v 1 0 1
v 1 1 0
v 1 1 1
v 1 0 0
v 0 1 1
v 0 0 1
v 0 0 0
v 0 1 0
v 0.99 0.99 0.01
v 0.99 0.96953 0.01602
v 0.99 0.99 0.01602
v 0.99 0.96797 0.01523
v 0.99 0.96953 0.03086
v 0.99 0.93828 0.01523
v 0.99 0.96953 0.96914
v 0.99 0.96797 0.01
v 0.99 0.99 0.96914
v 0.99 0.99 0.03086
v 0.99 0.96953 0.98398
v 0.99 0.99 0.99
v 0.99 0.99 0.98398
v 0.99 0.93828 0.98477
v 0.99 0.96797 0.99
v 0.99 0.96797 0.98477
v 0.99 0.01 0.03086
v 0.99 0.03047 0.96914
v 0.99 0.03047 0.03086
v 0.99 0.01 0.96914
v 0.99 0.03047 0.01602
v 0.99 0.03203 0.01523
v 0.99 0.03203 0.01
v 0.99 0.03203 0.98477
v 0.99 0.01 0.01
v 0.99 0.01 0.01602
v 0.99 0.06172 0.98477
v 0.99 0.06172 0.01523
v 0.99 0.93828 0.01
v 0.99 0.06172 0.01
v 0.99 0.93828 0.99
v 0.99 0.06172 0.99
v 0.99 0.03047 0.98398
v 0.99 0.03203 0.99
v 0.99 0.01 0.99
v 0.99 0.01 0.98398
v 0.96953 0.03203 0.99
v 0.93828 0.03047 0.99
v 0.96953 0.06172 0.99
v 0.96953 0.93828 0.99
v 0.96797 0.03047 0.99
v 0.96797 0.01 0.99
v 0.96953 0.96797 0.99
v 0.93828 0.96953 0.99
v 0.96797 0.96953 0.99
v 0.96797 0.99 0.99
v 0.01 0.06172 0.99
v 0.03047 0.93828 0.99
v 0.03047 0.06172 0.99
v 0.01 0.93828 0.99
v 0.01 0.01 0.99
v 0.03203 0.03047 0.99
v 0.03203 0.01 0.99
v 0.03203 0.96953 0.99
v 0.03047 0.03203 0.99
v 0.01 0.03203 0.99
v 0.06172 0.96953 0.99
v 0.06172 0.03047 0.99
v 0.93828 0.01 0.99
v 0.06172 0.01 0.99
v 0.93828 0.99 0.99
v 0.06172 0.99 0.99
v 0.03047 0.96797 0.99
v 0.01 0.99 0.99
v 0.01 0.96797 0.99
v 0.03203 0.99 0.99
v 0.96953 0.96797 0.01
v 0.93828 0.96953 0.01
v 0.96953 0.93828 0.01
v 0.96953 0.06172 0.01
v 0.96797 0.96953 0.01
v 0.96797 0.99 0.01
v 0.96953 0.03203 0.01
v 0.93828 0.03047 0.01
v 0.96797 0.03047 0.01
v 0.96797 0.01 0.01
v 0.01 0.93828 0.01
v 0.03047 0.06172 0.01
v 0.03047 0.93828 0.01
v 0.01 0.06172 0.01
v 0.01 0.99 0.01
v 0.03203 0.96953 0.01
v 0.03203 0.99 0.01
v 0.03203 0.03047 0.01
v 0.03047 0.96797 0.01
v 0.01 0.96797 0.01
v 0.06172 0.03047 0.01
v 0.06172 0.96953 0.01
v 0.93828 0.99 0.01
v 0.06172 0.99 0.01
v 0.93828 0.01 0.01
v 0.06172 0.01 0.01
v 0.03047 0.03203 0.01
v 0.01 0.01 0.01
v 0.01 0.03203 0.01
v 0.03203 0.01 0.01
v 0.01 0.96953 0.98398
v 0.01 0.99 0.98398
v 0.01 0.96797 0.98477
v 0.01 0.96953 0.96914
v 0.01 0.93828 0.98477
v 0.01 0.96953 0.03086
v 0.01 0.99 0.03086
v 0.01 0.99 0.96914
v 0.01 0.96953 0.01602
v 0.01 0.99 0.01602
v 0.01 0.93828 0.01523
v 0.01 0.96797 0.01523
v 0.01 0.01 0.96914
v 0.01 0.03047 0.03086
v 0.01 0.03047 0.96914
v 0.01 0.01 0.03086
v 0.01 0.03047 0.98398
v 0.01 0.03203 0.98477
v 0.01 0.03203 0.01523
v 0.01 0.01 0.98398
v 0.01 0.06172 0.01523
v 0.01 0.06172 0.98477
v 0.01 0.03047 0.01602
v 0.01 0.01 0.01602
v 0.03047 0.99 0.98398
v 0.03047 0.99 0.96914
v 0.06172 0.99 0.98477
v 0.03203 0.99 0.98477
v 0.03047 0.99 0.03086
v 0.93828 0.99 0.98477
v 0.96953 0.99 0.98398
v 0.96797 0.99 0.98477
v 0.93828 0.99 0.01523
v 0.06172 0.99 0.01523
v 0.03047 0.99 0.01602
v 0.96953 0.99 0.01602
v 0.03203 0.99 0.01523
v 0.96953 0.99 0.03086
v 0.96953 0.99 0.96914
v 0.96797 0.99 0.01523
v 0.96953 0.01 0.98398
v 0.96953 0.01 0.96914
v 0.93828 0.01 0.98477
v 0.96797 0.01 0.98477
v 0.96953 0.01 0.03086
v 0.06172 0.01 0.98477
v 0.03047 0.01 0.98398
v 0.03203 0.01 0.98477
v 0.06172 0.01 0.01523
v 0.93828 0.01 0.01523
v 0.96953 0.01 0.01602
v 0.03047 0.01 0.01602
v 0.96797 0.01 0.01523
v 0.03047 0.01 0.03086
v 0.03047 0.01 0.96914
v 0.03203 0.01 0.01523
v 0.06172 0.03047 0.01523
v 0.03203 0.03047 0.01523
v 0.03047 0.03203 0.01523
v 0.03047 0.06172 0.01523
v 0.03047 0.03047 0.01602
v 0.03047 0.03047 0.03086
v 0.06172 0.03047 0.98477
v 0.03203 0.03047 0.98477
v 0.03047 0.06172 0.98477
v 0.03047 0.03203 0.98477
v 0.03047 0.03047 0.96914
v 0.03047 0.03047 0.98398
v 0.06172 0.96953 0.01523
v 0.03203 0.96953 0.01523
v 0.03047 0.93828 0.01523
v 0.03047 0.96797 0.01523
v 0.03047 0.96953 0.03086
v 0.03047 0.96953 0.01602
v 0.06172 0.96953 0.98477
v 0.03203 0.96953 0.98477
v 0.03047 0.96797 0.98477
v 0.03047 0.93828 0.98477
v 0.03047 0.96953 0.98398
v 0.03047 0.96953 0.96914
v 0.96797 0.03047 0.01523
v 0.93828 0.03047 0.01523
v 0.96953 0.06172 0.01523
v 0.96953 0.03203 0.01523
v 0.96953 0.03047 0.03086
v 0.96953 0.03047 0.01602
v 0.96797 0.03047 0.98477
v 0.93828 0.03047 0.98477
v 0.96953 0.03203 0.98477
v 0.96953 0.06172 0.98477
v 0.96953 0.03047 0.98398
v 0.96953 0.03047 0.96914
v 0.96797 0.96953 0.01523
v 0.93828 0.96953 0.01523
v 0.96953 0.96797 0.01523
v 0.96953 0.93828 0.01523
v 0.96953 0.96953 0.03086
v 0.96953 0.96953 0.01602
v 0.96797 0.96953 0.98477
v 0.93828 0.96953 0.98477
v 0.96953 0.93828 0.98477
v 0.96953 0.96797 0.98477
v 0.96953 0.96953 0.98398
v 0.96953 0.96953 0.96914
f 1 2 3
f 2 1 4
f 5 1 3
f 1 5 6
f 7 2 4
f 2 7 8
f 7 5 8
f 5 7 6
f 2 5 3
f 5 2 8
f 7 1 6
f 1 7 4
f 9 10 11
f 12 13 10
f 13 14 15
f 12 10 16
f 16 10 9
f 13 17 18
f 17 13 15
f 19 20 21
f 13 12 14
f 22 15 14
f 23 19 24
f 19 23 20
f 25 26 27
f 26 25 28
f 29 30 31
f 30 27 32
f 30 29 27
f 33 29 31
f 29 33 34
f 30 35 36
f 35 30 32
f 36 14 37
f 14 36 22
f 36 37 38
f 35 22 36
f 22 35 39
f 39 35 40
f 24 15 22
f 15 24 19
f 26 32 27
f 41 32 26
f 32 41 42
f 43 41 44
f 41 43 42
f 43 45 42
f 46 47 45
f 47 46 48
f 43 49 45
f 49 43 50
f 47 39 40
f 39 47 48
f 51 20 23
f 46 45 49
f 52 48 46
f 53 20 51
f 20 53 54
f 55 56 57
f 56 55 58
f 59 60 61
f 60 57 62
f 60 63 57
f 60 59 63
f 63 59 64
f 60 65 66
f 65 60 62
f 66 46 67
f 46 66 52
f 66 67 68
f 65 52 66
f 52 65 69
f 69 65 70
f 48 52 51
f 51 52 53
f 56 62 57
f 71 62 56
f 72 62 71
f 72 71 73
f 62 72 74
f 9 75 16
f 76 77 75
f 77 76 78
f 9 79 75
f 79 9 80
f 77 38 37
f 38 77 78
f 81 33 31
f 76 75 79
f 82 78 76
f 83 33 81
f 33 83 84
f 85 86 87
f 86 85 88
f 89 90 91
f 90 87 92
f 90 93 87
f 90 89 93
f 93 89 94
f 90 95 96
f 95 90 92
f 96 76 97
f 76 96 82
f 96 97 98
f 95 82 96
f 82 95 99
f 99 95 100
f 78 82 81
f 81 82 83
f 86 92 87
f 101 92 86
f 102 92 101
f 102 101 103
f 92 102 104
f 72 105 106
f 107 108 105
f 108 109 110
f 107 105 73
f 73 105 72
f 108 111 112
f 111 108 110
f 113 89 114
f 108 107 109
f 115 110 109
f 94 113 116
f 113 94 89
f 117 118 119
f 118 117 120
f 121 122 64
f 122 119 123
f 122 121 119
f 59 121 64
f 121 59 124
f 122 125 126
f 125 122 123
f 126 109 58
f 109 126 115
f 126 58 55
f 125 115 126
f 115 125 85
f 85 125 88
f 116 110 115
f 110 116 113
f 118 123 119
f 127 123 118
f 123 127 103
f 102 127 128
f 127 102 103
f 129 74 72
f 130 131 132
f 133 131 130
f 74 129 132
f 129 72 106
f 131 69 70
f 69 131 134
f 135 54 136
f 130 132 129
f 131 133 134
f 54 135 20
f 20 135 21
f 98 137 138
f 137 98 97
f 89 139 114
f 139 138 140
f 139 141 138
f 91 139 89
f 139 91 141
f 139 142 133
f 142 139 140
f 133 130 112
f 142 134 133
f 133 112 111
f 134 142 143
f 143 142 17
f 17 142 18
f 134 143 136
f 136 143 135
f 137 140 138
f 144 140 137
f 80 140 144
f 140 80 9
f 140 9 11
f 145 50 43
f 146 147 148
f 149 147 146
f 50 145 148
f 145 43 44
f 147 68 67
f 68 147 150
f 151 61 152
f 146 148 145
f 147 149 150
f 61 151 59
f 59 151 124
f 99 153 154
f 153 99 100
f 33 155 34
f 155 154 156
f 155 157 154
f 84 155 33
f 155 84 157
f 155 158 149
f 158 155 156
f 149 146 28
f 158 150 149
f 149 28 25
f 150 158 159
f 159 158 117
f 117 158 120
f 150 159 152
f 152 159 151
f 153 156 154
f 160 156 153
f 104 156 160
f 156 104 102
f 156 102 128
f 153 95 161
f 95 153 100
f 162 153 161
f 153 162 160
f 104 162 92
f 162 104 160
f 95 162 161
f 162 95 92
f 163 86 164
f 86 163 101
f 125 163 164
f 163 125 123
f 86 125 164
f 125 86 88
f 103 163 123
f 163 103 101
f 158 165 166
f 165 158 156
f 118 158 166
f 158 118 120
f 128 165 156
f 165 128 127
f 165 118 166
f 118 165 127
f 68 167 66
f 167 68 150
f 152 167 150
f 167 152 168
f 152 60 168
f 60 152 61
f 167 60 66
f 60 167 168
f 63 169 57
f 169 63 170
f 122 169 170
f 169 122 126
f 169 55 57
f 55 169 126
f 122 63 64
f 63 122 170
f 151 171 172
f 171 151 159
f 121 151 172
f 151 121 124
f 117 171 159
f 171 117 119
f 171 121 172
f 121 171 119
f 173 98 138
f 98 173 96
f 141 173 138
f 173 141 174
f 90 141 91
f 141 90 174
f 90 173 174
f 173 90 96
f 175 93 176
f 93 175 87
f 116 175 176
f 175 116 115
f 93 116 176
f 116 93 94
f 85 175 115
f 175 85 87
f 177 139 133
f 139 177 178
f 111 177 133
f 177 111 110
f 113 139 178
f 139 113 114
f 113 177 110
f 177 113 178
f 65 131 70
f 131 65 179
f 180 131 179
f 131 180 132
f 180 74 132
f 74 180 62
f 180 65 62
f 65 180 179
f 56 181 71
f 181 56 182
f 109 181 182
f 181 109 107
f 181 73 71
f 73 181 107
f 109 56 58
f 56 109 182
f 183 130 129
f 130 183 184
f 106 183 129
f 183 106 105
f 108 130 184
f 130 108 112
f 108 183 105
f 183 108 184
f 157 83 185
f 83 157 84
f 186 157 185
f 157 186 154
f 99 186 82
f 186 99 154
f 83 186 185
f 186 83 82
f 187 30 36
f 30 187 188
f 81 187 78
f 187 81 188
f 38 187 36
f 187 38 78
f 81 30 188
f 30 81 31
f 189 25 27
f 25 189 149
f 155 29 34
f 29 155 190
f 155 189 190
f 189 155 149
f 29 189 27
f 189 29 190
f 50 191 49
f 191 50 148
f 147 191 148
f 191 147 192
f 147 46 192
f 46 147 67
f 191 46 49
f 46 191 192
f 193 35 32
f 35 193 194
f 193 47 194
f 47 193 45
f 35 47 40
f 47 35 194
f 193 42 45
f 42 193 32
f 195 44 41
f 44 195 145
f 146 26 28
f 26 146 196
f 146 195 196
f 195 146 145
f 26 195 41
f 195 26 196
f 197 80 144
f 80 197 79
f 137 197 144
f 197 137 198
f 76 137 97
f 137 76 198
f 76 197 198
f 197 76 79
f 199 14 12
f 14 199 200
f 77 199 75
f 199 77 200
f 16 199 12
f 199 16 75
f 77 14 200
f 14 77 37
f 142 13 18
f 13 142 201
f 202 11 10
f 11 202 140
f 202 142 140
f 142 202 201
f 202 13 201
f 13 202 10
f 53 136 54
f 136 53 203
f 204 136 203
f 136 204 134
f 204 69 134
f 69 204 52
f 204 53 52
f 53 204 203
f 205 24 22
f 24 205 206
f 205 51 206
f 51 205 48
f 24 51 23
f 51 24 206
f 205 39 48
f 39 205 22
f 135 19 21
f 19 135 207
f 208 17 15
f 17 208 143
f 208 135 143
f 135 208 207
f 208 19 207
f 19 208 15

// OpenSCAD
translate([0.046875, 0.015625, 0.0078125]) color([0.09291561905233803, 0.32559643331469756, 0.8637836206731688]) cube([0.0296875, 0.0296875, 0.01484375], center=true);
translate([0.015625, 0.046875, 0.0078125]) color([0.0755408536708897, 0.1598560105102368, 0.31161941001335236]) cube([0.0296875, 0.0296875, 0.01484375], center=true);
translate([0.015625, 0.015625, 0.0234375]) color([0.5530814406047818, 0.47379059437394766, 0.5189440780043909]) cube([0.0296875, 0.0296875, 0.01484375], center=true);
translate([0.046875, 0.015625, 0.9921875]) color([0.39979725631427454, 0.3052895154032831, 0.497777595368291]) cube([0.0296875, 0.0296875, 0.01484375], center=true);
translate([0.015625, 0.046875, 0.9921875]) color([0.8430905252848612, 0.7660809142318178, 0.6887450589659723]) cube([0.0296875, 0.0296875, 0.01484375], center=true);
translate([0.015625, 0.015625, 0.9765625]) color([0.30403629458024817, 0.4636808704508887, 0.9585844277038224]) cube([0.0296875, 0.0296875, 0.01484375], center=true);
translate([0.046875, 0.984375, 0.0078125]) color([0.5898695798922989, 0.3159415992007023, 0.7646318720079991]) cube([0.0296875, 0.0296875, 0.01484375], center=true);
translate([0.015625, 0.953125, 0.0078125]) color([0.2844817164731336, 0.003980419597673146, 0.21365787796152824]) cube([0.0296875, 0.0296875, 0.01484375], center=true);
translate([0.015625, 0.984375, 0.0234375]) color([0.12307913805948867, 0.9468358508513299, 0.148971570476369]) cube([0.0296875, 0.0296875, 0.01484375], center=true);
translate([0.046875, 0.984375, 0.9921875]) color([0.590141114679526, 0.8942884948270212, 0.3540218239361119]) cube([0.0296875, 0.0296875, 0.01484375], center=true);
translate([0.015625, 0.953125, 0.9921875]) color([0.2800942077865013, 0.47245122391124206, 0.8634339642238084]) cube([0.0296875, 0.0296875, 0.01484375], center=true);
translate([0.015625, 0.984375, 0.9765625]) color([0.2873659346133881, 0.1424720644020956, 0.1334450500091784]) cube([0.0296875, 0.0296875, 0.01484375], center=true);
translate([0.953125, 0.015625, 0.0078125]) color([0.7630276888410245, 0.12028611959760738, 0.24823792454889804]) cube([0.0296875, 0.0296875, 0.01484375], center=true);
translate([0.984375, 0.046875, 0.0078125]) color([0.6587088466212176, 0.4283383743340329, 0.812704823451538]) cube([0.0296875, 0.0296875, 0.01484375], center=true);
translate([0.984375, 0.015625, 0.0234375]) color([0.3182152094088553, 0.45776118865833404, 0.6931634325544874]) cube([0.0296875, 0.0296875, 0.01484375], center=true);
translate([0.953125, 0.015625, 0.9921875]) color([0.9182903899777837, 0.09632973778264453, 0.3354199459915884]) cube([0.0296875, 0.0296875, 0.01484375], center=true);
translate([0.984375, 0.046875, 0.9921875]) color([0.8438891473936788, 0.44303383974302113, 0.31850207914284234]) cube([0.0296875, 0.0296875, 0.01484375], center=true);
translate([0.984375, 0.015625, 0.9765625]) color([0.8760077186592833, 0.7219780049965348, 0.43502244096112175]) cube([0.0296875, 0.0296875, 0.01484375], center=true);
translate([0.953125, 0.984375, 0.0078125]) color([0.500153012923997, 0.5350600311484602, 0.4940330664983029]) cube([0.0296875, 0.0296875, 0.01484375], center=true);
translate([0.984375, 0.953125, 0.0078125]) color([0.18441863541912984, 0.39646650222090685, 0.3623458375265177]) cube([0.0296875, 0.0296875, 0.01484375], center=true);
translate([0.984375, 0.984375, 0.0234375]) color([0.516929932572908, 0.31072444413917544, 0.32410391770262625]) cube([0.0296875, 0.0296875, 0.01484375], center=true);
translate([0.953125, 0.984375, 0.9921875]) color([0.20295389468758984, 0.936554283951154, 0.7990327015401891]) cube([0.0296875, 0.0296875, 0.01484375], center=true);
translate([0.984375, 0.953125, 0.9921875]) color([0.09477180693915743, 0.1571565364927836, 0.7014735119984714]) cube([0.0296875, 0.0296875, 0.01484375], center=true);
translate([0.984375, 0.984375, 0.9765625]) color([0.337660429145759, 0.3679824296598143, 0.730152528573699]) cube([0.0296875, 0.0296875, 0.01484375], center=true);
color([0.3,0.3,0.3,0.3]) difference() { cube([1,1,1]); translate([0.01,0.01,0.01]) cube([0.98,0.98,0.98]); }
